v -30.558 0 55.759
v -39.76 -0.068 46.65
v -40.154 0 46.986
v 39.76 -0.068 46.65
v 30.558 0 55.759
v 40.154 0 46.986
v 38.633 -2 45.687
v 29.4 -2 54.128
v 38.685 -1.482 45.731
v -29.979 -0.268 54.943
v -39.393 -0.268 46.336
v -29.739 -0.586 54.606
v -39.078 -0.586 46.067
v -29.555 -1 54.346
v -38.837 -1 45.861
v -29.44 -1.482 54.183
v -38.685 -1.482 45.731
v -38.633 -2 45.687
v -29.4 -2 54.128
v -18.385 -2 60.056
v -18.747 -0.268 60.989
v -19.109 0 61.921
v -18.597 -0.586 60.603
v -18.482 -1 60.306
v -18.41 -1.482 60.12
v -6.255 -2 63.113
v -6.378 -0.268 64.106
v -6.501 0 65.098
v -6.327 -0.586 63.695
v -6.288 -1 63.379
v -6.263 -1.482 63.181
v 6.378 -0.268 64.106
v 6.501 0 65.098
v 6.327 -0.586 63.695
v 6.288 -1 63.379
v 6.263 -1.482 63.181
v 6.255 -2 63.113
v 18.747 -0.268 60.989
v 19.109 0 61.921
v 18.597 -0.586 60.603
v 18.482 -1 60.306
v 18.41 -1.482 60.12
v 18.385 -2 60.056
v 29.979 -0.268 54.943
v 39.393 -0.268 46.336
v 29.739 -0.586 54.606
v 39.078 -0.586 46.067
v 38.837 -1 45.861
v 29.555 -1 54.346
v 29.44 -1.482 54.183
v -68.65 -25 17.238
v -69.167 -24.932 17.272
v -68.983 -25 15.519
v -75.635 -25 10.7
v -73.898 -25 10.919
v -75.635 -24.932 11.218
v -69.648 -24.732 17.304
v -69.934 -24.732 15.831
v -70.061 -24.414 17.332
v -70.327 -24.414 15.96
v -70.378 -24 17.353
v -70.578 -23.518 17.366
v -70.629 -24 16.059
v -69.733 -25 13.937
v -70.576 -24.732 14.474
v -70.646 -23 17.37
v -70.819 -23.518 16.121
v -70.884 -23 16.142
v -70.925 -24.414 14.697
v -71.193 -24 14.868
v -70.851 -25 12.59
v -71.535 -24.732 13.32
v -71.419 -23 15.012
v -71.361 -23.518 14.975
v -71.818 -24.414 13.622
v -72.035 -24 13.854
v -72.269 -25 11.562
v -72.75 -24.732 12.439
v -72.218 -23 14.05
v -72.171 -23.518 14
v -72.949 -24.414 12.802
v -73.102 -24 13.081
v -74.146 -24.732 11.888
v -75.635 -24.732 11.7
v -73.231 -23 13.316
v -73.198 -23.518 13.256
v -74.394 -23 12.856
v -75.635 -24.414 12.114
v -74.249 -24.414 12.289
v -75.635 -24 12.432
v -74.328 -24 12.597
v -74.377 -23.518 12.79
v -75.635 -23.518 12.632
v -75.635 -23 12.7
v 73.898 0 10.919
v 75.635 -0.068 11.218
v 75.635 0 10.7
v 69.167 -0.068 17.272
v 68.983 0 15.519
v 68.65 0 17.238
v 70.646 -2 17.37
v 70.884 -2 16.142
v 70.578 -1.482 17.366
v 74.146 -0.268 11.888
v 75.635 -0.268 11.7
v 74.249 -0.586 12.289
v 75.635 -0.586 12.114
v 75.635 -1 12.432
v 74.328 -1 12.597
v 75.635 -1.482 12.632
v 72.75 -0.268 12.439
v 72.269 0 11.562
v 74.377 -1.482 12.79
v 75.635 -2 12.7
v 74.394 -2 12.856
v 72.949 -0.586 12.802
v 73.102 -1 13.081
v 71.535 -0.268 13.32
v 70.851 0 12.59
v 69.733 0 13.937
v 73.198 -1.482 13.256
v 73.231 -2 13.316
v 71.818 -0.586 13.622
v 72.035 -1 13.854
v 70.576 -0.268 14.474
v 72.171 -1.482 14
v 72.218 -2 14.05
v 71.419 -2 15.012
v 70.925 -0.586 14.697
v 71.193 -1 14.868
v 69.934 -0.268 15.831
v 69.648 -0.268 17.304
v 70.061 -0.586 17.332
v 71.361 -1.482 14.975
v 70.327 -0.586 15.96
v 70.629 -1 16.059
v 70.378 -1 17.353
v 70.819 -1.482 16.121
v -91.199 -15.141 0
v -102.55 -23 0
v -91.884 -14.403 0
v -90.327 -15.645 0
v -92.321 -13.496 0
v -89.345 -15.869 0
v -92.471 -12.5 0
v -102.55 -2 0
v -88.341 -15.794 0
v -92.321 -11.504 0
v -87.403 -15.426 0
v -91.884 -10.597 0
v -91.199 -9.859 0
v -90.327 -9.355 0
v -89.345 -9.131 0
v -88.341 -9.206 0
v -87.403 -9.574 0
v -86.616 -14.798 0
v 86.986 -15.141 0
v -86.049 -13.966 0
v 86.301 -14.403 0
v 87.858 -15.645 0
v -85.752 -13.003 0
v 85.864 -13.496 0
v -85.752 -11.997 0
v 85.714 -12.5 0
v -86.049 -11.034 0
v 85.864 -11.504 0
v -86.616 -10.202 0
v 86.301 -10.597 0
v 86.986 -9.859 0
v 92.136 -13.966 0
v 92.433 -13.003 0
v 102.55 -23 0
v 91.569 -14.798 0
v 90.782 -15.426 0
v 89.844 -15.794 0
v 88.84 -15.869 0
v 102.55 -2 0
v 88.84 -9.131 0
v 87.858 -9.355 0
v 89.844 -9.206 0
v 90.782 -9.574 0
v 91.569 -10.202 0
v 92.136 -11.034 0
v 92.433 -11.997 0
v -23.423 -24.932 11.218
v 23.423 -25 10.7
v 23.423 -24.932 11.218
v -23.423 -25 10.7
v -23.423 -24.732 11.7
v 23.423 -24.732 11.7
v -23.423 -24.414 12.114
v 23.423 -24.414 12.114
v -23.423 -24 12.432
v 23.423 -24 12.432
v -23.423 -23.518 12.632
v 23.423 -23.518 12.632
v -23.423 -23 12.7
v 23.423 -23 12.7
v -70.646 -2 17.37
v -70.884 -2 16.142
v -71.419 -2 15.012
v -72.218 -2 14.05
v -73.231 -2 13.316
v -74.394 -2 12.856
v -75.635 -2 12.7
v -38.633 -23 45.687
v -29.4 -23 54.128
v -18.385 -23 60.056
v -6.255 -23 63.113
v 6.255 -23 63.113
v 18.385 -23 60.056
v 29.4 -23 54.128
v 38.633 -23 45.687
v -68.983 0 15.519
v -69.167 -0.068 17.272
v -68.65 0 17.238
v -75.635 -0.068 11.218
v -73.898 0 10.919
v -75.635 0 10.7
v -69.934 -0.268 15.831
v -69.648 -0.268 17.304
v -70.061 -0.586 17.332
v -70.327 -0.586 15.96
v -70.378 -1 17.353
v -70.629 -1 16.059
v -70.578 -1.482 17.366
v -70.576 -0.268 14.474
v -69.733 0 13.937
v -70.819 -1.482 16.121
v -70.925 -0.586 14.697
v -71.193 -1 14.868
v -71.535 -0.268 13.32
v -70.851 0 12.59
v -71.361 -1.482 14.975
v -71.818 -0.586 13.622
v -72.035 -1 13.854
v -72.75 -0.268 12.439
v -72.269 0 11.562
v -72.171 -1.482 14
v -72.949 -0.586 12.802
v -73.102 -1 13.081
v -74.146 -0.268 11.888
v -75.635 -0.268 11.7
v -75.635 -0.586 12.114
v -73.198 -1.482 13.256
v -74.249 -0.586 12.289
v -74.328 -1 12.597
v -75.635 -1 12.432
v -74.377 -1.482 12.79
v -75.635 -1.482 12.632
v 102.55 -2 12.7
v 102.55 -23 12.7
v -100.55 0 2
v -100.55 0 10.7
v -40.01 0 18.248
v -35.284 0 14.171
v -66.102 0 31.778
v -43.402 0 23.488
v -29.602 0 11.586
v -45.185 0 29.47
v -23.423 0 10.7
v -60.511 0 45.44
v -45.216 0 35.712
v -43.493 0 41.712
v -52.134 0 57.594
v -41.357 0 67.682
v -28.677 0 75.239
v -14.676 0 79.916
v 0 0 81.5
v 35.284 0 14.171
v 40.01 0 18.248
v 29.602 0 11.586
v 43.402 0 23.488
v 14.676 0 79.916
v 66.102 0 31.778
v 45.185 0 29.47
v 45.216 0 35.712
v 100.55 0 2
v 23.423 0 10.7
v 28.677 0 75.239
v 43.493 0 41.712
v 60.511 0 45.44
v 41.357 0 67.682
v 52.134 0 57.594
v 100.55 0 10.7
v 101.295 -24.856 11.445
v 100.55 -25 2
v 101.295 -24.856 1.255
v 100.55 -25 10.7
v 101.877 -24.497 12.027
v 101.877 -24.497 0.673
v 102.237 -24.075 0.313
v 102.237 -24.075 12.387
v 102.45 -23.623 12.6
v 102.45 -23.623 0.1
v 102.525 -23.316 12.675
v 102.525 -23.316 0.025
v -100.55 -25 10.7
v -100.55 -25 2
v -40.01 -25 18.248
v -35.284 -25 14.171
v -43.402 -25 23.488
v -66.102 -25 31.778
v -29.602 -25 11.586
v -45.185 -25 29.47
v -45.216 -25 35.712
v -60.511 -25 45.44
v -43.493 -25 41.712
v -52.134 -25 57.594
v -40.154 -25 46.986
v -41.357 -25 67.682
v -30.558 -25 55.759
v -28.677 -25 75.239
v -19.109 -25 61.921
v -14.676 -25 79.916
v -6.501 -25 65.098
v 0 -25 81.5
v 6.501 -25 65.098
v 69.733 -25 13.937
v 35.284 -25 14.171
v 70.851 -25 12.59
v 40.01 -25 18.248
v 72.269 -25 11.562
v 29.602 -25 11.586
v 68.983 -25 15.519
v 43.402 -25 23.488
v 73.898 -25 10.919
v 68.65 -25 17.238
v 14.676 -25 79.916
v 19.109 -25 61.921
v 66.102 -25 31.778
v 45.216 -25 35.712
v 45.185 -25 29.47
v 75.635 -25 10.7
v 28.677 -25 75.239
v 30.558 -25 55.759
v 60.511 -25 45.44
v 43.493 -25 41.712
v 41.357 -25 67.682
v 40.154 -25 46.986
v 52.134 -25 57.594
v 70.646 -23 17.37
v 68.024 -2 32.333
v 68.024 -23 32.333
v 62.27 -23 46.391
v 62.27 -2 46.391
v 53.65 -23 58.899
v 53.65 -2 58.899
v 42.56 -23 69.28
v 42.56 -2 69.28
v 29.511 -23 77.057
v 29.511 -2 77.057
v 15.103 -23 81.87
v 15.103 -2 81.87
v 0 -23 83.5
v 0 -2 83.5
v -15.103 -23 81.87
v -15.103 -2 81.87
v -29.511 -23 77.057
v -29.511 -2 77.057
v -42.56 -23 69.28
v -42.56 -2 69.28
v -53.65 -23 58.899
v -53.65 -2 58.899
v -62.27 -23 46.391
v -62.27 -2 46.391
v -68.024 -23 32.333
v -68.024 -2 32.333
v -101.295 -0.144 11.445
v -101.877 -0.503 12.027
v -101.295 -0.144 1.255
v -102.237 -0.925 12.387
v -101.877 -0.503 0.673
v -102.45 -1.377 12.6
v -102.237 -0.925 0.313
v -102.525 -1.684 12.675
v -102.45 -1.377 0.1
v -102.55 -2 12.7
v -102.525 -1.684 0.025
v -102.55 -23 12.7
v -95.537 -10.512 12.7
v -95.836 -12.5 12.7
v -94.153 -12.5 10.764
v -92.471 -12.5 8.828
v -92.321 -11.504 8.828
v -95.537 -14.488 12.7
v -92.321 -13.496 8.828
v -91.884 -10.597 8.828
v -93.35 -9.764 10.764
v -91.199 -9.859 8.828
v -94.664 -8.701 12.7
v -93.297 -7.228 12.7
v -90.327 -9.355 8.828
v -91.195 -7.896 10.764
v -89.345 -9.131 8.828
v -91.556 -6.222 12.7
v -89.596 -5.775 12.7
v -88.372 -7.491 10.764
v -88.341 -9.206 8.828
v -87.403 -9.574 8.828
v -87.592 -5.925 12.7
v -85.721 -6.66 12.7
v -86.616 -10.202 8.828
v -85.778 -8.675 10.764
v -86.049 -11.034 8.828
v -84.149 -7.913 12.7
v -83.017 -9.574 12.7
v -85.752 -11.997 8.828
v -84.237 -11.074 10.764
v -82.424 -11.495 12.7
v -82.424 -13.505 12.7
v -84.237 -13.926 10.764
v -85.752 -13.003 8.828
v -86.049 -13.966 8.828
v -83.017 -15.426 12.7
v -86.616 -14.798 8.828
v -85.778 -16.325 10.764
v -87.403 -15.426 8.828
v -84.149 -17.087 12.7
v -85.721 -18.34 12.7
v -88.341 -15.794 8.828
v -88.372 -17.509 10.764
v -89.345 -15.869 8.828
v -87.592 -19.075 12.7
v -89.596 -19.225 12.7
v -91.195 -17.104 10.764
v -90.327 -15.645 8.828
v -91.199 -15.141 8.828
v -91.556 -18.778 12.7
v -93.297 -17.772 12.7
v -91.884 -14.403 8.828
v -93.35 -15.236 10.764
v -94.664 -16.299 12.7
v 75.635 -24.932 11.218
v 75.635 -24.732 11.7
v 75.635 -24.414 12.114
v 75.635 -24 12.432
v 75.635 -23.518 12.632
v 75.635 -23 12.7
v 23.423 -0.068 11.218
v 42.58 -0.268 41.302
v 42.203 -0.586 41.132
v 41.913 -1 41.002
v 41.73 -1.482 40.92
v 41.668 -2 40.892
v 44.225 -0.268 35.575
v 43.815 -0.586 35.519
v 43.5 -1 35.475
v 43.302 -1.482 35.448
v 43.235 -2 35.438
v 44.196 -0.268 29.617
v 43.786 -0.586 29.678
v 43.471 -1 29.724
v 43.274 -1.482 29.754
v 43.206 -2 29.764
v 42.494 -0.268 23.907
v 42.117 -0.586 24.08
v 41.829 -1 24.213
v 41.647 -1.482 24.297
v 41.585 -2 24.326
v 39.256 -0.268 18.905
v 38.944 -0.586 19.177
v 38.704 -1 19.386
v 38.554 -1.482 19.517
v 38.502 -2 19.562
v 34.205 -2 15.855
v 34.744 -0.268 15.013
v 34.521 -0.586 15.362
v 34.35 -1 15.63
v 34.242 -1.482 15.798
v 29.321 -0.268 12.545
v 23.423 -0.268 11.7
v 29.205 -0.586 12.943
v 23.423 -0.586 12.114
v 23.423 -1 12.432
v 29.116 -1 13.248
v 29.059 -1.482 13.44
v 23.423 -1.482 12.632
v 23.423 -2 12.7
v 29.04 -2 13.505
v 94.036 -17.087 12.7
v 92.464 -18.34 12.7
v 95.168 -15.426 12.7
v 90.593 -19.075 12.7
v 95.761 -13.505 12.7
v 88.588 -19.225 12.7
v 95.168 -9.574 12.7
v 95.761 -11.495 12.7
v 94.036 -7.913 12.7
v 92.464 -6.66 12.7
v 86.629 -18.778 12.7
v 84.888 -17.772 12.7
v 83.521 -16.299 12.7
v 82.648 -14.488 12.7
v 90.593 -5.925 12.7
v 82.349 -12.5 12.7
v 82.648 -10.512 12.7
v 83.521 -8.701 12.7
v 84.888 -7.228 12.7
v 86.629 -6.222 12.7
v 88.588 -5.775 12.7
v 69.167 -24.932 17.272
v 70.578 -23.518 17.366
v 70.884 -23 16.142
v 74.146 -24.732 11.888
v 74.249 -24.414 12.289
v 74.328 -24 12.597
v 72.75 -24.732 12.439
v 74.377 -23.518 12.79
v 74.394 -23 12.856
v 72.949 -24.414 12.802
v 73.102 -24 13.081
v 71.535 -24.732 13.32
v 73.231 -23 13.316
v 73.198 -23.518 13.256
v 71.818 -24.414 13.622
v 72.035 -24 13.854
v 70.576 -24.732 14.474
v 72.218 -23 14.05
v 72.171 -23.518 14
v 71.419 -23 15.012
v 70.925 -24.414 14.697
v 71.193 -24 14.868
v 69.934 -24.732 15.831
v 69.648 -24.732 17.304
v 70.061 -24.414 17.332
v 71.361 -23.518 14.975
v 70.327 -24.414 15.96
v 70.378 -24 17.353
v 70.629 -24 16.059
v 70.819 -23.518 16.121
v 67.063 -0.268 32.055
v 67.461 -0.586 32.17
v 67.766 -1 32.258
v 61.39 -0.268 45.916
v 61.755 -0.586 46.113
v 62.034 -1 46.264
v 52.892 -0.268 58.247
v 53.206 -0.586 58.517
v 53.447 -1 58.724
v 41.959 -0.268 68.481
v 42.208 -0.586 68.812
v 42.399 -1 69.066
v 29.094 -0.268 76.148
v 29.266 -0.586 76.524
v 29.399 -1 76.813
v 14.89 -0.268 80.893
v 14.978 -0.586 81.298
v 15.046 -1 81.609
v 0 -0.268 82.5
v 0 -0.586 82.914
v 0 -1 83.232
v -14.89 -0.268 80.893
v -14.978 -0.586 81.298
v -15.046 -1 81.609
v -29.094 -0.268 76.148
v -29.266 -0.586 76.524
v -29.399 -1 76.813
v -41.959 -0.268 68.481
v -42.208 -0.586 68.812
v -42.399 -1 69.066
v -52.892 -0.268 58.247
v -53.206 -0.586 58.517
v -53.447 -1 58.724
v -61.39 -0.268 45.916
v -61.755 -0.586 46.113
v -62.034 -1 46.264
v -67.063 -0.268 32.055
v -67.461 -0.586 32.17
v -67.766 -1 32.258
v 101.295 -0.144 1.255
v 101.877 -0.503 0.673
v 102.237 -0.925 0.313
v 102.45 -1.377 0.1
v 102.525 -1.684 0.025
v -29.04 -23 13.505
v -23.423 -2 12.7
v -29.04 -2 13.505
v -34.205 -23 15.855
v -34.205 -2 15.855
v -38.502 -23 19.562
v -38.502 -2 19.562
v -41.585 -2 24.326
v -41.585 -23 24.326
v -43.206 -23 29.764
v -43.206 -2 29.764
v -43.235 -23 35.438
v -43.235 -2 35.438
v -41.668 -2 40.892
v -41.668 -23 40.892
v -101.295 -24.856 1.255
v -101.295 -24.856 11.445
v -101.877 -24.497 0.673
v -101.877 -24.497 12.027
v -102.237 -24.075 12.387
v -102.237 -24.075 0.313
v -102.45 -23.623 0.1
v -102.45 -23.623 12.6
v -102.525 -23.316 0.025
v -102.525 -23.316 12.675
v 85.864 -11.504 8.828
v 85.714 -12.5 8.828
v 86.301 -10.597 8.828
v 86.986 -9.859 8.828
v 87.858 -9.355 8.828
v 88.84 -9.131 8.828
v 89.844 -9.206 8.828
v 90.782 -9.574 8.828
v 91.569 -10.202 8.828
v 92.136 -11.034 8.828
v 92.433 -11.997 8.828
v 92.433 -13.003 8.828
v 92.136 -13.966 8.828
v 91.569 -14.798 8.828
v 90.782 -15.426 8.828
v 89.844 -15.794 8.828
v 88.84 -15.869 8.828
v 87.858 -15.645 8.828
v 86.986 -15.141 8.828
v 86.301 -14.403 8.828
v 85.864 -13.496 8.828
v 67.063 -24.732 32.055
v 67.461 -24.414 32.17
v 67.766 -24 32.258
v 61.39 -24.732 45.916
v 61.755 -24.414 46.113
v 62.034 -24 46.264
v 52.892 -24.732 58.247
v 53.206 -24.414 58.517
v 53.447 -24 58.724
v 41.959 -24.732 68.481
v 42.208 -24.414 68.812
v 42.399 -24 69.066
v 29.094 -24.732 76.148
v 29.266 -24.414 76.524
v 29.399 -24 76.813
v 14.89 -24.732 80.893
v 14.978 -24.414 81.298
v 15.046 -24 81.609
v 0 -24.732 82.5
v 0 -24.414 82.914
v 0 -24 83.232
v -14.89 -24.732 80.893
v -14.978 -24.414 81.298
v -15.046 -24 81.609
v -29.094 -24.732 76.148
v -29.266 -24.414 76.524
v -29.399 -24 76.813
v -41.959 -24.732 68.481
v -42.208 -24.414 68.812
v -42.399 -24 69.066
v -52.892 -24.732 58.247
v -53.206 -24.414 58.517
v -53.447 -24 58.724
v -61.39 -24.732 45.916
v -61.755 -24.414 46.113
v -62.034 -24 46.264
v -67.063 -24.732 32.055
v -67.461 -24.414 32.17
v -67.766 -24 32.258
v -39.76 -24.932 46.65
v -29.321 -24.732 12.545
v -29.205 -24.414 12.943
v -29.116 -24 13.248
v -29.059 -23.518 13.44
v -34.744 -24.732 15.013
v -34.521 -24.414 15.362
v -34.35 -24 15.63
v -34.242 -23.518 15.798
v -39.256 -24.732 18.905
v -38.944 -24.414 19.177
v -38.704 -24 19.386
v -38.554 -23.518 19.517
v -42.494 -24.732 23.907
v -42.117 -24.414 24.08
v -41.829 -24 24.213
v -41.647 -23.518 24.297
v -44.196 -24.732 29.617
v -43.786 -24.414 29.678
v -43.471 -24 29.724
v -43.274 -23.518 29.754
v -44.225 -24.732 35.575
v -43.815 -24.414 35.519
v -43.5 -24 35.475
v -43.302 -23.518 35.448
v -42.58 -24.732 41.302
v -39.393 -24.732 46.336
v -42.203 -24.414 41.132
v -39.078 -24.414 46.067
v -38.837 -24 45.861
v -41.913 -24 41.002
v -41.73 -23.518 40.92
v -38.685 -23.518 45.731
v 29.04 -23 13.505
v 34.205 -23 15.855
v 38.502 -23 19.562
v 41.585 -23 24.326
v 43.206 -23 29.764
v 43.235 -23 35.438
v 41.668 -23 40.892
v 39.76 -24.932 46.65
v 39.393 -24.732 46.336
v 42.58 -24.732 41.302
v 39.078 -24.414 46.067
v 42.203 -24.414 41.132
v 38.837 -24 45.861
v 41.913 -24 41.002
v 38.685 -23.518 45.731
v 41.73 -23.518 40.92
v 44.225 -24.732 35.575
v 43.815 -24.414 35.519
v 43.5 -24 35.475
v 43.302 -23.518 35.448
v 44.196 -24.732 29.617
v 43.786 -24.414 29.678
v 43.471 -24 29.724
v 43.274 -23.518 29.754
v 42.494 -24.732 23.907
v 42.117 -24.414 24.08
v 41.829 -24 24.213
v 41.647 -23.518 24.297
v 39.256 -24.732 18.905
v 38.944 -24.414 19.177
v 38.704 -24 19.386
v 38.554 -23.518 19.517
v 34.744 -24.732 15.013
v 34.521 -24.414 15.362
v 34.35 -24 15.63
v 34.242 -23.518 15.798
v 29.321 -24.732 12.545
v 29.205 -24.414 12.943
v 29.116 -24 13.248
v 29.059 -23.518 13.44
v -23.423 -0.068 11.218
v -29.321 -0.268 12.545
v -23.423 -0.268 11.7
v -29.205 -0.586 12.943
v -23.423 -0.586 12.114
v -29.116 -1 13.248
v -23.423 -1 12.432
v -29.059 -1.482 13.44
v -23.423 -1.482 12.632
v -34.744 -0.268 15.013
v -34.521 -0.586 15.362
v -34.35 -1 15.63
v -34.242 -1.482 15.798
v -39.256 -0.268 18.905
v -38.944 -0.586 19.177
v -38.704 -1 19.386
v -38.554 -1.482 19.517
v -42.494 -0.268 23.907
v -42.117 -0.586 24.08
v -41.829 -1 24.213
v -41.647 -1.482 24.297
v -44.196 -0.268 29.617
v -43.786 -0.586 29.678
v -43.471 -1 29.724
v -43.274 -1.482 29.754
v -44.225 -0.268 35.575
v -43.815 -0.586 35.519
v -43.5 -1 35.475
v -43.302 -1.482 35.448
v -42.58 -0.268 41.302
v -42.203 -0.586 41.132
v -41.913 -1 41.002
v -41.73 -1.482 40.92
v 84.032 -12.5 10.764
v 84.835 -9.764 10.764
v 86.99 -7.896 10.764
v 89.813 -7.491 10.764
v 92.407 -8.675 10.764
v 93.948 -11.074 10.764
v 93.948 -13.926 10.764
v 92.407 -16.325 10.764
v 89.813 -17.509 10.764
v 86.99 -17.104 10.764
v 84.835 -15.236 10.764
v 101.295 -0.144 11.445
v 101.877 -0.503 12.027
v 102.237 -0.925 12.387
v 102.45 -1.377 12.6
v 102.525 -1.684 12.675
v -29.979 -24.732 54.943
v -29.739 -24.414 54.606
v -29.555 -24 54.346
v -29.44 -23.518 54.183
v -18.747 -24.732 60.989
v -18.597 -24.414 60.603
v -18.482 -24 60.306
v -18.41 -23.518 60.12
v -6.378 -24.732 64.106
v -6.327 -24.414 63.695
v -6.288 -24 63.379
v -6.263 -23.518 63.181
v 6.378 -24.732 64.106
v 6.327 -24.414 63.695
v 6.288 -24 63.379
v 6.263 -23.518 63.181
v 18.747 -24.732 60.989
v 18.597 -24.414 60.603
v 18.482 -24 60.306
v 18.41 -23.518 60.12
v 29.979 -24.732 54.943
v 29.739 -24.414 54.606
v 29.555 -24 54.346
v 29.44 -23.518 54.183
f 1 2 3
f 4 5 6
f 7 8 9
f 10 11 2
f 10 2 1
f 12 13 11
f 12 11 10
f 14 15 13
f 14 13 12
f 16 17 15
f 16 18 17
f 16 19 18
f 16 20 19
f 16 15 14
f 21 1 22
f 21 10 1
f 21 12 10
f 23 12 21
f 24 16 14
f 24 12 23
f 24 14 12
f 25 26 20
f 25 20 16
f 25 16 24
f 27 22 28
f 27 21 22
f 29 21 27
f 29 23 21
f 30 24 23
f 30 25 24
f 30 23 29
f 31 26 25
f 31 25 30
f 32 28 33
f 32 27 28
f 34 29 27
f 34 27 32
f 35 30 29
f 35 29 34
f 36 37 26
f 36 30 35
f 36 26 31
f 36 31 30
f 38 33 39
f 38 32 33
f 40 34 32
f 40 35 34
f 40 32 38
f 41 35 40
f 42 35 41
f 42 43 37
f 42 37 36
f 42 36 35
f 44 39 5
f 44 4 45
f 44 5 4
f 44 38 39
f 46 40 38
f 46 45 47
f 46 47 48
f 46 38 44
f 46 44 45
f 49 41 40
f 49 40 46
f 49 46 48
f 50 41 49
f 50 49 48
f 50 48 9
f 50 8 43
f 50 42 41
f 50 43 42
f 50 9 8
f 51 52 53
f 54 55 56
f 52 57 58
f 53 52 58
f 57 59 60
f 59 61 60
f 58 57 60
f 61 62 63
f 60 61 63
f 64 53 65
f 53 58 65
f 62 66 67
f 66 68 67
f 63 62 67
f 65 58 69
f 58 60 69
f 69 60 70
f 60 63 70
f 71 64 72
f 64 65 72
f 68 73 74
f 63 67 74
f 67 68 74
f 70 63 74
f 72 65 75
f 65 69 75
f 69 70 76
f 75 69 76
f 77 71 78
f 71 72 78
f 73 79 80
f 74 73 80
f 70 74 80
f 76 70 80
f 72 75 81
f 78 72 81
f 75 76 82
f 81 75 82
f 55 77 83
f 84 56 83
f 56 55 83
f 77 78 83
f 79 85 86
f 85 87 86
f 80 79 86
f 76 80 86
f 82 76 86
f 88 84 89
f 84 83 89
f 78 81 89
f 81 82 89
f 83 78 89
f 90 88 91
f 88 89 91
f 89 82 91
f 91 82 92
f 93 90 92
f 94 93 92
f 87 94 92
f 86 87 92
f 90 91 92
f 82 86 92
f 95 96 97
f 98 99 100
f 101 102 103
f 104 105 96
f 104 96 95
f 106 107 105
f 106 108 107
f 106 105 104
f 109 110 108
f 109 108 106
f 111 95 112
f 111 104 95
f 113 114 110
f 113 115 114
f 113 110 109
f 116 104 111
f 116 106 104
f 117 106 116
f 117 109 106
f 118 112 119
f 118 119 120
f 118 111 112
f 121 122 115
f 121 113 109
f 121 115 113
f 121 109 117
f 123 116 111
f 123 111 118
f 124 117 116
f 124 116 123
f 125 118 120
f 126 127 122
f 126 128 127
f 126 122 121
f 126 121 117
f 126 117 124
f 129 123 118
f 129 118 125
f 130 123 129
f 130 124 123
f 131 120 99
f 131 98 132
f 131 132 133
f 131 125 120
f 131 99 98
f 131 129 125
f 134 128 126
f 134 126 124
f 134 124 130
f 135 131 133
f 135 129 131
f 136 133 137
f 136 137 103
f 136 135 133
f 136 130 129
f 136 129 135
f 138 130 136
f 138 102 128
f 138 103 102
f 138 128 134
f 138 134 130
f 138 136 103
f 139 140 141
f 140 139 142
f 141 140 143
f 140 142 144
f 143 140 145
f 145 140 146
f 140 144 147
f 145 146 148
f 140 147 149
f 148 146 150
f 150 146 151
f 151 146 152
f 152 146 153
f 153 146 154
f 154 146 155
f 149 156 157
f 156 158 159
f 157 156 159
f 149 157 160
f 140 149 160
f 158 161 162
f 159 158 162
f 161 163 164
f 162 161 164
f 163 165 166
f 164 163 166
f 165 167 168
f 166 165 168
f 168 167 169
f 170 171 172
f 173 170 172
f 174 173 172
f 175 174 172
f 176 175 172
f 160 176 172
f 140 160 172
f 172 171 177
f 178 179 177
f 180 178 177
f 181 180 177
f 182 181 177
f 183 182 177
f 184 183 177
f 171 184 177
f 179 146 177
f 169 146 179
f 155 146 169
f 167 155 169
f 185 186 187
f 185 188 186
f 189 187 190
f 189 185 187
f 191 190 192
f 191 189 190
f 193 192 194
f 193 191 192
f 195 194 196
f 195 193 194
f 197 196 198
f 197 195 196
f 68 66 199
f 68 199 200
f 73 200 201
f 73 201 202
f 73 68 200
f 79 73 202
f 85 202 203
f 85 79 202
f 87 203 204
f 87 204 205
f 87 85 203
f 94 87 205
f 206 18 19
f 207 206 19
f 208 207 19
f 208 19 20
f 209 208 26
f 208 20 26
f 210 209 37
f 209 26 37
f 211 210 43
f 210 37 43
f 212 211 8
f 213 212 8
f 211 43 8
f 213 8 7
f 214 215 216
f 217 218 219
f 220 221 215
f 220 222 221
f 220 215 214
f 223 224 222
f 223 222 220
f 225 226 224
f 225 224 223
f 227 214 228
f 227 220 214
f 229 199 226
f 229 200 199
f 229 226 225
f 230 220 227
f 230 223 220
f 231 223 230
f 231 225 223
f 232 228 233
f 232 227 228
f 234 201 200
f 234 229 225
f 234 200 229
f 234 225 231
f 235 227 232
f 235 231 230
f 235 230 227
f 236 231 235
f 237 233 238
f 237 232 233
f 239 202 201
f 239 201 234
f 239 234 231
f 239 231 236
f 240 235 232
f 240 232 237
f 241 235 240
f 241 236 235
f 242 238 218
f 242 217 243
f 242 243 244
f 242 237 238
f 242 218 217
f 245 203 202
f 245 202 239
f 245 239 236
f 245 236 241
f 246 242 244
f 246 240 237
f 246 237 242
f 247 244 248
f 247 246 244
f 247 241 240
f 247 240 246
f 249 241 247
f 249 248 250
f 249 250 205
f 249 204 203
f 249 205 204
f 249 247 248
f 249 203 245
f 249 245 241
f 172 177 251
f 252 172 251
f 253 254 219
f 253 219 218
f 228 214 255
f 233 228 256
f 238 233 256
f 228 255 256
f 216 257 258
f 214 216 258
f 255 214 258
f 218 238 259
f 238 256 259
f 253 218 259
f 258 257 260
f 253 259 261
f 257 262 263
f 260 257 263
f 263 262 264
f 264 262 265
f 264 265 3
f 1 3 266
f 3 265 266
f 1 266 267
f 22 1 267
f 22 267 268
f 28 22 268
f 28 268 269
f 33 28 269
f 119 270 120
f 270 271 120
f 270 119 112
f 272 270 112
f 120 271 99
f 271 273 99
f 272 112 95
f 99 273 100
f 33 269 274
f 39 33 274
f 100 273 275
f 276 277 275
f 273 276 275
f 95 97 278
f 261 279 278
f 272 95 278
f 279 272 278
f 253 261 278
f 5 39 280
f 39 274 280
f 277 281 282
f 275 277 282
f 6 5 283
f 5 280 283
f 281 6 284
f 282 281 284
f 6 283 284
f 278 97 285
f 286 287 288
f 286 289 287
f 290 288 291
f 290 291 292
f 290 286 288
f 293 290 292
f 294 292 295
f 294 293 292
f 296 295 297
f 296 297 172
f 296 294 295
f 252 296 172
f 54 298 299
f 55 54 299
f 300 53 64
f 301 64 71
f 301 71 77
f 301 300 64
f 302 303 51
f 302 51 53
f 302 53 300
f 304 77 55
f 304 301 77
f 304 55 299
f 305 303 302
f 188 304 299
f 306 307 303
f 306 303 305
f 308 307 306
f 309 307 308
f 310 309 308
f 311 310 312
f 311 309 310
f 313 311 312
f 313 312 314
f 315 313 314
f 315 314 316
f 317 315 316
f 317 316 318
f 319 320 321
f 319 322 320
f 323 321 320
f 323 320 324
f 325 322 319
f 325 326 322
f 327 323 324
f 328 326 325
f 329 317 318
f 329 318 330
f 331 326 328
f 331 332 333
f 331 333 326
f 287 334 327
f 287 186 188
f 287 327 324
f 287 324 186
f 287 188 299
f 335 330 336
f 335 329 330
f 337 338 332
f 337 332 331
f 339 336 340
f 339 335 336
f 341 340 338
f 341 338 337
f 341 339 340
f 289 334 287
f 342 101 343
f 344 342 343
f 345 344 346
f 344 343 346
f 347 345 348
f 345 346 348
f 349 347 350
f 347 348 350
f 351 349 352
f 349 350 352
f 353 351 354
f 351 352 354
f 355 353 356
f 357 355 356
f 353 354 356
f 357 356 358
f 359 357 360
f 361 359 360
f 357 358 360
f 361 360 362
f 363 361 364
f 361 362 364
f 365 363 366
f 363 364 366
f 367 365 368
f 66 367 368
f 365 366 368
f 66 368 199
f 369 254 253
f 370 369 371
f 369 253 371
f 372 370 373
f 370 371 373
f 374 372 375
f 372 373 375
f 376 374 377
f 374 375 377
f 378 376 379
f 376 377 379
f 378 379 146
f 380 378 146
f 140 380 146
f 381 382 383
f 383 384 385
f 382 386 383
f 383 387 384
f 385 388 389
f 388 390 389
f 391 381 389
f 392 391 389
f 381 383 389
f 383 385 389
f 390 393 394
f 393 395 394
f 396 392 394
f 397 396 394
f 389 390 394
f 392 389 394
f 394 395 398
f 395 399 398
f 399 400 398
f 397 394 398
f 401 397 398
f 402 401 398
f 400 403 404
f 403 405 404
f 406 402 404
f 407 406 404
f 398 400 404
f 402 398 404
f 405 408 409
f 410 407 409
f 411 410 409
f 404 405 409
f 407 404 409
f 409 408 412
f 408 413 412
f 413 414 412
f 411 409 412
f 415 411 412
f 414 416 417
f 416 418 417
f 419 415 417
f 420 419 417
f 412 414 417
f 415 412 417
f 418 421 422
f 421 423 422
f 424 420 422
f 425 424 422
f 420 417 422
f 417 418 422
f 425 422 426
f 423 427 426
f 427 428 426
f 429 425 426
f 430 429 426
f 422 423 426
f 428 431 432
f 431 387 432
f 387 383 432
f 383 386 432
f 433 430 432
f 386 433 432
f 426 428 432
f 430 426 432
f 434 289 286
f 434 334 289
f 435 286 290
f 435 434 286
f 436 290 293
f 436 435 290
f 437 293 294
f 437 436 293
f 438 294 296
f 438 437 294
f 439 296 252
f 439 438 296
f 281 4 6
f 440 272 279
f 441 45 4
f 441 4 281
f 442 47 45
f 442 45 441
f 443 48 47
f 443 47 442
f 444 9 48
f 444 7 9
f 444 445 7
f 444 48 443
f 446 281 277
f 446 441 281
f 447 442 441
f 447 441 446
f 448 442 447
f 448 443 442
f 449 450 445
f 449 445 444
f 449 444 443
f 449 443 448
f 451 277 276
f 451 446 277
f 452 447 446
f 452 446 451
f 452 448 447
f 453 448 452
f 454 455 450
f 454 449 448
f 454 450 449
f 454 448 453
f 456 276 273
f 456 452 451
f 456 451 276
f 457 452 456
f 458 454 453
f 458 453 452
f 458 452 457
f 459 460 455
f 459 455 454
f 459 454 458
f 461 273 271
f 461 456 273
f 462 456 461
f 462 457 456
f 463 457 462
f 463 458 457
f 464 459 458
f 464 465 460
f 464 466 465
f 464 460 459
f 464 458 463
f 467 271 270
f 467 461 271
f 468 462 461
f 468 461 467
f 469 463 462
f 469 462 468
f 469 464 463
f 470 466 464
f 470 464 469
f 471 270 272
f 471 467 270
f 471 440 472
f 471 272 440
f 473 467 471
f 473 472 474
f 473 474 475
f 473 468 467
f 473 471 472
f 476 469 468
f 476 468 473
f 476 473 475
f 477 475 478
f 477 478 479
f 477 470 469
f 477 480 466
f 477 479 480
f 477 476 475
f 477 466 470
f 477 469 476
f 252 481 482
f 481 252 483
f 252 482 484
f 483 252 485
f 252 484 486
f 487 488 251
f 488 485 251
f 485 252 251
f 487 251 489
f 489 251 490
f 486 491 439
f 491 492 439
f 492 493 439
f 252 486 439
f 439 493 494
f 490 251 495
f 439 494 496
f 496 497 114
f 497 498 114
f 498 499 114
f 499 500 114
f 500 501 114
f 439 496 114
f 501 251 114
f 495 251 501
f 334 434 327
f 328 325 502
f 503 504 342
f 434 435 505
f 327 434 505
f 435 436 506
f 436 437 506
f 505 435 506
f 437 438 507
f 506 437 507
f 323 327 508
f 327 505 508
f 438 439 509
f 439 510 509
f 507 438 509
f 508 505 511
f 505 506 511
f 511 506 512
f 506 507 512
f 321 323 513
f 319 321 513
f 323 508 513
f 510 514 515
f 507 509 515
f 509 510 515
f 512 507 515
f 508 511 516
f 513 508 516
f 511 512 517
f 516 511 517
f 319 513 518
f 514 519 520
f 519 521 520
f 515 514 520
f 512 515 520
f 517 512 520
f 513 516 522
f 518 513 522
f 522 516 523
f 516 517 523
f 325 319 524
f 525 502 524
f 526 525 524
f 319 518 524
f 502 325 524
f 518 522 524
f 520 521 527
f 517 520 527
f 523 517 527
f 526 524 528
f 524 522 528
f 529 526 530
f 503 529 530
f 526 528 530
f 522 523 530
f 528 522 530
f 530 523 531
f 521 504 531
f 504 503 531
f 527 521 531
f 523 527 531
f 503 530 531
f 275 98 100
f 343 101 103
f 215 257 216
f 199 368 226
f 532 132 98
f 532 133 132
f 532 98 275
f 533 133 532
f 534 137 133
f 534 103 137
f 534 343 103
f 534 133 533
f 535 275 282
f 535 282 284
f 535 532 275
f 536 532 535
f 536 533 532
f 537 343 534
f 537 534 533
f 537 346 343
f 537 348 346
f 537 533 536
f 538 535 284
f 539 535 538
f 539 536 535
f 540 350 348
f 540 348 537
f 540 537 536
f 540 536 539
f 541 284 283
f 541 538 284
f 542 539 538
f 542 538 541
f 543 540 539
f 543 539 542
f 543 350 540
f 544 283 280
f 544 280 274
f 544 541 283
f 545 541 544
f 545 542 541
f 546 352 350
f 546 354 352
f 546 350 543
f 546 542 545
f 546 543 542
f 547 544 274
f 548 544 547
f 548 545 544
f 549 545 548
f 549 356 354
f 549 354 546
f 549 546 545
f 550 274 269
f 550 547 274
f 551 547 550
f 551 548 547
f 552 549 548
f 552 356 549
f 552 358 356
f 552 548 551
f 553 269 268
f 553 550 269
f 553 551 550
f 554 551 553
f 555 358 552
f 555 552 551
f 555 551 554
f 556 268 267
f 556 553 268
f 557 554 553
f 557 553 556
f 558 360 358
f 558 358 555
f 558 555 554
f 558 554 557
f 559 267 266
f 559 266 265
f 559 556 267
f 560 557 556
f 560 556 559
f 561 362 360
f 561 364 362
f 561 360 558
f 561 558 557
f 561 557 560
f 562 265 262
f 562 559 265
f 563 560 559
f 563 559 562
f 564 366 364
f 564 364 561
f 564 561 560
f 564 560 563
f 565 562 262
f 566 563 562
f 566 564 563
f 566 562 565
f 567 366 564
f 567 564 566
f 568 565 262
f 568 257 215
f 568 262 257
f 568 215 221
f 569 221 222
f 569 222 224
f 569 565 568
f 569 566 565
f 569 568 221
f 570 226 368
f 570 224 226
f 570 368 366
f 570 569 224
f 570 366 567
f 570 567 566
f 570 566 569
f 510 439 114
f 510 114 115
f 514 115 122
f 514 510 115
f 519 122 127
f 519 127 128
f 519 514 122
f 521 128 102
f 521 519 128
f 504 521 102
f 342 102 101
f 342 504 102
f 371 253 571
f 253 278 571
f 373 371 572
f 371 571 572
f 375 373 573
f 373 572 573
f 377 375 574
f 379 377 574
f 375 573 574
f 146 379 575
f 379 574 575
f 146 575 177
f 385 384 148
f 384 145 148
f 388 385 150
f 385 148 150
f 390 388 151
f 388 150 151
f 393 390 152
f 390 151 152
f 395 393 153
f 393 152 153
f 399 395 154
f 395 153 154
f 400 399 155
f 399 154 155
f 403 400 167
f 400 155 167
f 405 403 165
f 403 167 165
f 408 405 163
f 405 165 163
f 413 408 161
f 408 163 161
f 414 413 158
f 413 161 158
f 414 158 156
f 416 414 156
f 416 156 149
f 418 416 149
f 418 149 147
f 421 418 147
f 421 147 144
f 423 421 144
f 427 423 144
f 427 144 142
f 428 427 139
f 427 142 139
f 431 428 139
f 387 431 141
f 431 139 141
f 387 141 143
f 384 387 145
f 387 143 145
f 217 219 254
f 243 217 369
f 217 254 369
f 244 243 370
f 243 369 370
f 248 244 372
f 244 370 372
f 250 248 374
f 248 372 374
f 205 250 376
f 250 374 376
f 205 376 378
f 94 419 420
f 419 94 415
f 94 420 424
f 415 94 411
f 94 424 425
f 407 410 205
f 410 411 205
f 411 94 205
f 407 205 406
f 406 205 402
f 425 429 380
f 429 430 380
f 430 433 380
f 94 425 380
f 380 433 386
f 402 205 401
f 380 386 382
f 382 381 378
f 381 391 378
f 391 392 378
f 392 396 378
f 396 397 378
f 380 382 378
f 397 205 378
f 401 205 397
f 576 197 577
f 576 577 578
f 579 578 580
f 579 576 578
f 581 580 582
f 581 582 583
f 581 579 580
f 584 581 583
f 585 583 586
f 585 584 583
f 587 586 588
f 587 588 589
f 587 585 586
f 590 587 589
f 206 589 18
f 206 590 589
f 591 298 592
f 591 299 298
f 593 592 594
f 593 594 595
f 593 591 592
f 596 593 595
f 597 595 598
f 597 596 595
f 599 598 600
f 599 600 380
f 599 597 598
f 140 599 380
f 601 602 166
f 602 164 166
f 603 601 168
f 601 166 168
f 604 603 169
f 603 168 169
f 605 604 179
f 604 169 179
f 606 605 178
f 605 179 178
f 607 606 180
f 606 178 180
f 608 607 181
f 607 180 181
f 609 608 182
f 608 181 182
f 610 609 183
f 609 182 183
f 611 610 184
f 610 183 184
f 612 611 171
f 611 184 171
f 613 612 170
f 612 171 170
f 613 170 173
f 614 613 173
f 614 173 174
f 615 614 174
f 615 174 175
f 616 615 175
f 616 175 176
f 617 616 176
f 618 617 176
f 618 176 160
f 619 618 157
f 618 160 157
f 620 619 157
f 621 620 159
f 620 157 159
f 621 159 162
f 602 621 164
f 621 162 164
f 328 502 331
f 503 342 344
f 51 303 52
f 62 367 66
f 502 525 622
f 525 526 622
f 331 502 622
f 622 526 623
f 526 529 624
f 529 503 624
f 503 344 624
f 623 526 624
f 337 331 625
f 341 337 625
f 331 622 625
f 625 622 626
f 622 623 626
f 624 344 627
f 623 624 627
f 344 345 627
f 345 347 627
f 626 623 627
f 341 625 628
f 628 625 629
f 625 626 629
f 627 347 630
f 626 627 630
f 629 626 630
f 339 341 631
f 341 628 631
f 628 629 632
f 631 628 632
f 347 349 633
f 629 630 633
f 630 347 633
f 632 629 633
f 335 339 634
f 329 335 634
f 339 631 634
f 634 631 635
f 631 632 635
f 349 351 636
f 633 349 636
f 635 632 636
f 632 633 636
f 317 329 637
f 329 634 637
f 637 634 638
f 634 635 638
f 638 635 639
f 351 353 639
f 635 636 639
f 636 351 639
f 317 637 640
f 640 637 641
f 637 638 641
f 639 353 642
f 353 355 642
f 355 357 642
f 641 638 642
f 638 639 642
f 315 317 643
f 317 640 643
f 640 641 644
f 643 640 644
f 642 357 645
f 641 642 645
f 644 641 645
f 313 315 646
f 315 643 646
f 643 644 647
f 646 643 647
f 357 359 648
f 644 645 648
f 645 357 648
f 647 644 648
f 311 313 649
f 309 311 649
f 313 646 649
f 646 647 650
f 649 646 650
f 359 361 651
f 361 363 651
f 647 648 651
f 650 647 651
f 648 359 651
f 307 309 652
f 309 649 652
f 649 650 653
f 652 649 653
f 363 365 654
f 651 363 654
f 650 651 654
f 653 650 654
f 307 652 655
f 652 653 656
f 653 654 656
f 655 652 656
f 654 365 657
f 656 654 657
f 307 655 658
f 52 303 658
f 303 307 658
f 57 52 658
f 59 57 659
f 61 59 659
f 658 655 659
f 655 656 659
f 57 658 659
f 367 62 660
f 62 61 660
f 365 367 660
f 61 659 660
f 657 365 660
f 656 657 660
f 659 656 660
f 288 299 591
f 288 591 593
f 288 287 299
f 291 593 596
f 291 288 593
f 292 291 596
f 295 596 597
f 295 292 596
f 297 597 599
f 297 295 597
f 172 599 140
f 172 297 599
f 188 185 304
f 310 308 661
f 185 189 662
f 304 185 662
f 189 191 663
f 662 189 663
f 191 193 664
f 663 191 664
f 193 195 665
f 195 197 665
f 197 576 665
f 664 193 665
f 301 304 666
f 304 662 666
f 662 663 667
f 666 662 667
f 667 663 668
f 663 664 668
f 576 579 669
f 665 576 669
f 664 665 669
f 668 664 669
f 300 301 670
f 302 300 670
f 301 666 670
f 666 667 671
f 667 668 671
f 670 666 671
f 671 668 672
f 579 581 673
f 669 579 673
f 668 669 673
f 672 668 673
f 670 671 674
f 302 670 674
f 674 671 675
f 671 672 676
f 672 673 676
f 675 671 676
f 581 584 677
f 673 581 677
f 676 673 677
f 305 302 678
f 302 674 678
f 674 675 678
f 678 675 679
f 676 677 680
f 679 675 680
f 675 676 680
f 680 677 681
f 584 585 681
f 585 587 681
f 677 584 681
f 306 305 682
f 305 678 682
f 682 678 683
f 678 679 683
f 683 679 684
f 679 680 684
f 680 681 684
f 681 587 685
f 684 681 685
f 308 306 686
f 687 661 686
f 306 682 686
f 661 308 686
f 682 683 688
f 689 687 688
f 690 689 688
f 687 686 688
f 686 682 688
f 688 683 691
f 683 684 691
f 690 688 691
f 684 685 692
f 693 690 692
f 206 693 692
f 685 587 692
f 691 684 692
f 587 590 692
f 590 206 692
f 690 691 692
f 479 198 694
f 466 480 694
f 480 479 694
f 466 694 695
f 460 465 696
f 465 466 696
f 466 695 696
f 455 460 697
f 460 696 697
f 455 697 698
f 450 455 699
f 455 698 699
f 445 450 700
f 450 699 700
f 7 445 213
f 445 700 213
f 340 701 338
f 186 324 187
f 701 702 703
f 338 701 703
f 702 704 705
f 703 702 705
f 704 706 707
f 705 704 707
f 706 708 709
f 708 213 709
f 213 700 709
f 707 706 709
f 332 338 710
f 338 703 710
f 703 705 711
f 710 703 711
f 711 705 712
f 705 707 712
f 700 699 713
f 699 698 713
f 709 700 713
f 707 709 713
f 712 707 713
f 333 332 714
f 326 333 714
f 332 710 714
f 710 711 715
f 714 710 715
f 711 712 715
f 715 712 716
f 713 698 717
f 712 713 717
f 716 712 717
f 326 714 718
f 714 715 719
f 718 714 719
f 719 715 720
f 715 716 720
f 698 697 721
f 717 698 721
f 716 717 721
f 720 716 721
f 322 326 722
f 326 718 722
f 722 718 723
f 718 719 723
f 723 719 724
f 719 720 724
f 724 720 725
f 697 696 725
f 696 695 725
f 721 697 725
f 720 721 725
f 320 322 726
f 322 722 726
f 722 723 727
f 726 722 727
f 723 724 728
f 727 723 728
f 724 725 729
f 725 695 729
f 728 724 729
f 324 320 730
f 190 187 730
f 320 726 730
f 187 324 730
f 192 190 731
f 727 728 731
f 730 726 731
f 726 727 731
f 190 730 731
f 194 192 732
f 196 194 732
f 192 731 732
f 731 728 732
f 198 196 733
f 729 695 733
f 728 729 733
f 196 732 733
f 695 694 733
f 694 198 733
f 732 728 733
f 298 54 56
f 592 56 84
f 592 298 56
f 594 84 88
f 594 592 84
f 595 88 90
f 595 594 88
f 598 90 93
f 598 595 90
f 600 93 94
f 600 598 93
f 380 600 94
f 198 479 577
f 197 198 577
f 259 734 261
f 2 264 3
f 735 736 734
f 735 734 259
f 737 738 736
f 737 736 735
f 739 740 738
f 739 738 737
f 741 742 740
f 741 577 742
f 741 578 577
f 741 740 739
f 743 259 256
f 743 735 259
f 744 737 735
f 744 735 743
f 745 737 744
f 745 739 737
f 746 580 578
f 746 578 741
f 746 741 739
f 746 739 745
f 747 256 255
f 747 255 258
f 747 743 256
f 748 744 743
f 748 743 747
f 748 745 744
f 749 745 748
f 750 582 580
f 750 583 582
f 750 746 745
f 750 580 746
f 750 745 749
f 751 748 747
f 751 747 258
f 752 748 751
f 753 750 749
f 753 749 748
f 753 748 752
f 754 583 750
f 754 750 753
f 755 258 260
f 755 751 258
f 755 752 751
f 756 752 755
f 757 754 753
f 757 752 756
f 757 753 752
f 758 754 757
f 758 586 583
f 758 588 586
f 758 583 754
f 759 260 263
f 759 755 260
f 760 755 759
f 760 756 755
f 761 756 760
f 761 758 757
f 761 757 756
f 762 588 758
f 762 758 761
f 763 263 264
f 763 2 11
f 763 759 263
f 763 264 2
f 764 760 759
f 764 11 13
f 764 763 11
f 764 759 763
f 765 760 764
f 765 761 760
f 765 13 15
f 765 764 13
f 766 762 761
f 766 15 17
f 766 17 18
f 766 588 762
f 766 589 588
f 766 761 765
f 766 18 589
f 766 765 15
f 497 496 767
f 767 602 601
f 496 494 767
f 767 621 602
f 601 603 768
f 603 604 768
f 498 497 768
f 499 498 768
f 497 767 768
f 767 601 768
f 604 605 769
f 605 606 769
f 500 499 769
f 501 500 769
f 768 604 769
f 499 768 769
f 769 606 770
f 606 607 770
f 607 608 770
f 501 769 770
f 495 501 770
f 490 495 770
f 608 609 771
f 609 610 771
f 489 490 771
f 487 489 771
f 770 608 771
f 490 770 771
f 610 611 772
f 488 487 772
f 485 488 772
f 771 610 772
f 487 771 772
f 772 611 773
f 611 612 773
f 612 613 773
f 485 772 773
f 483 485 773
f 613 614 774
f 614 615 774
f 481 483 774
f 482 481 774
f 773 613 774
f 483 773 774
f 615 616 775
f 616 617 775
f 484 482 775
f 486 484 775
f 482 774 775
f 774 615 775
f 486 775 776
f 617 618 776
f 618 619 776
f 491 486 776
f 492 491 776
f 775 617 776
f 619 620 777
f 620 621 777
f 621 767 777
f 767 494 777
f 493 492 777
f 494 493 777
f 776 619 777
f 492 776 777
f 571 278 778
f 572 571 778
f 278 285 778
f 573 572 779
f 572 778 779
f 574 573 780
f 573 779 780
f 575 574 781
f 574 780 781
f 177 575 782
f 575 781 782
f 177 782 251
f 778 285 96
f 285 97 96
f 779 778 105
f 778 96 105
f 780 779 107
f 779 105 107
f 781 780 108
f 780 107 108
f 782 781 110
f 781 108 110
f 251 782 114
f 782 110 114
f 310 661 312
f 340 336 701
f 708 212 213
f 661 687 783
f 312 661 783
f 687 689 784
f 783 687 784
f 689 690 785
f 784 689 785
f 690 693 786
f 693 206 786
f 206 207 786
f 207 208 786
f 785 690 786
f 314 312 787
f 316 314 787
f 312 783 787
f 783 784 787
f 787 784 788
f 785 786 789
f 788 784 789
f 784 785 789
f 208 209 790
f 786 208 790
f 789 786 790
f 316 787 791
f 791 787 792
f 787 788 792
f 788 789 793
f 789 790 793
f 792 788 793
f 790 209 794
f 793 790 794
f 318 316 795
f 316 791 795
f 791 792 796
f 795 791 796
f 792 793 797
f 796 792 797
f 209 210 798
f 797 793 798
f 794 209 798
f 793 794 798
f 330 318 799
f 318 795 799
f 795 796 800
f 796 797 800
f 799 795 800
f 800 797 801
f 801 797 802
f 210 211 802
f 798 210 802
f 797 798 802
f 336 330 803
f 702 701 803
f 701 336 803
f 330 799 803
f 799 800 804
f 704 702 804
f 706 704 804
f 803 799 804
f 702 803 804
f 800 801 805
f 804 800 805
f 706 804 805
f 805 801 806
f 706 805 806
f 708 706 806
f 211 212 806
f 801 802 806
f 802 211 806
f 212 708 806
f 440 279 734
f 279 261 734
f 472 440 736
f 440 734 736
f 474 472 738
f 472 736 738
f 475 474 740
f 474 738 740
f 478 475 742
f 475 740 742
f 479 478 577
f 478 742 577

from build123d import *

# Parameters (mm, degrees)
F1_DEPTH       = 25
F2_R           = 20
F3_R           = 5
F5_D           = 6.7564
F5_DEPTH       = 15
F5_CSINK_D     = 13.4874
F5_CSINK_ANGLE = 82
F5_TIP         = 2.0298273432
F6_R           = 2


with BuildPart() as f1:
    # F0 (on Front) → F1 (new body)
    with BuildSketch(Plane.XZ):
        Polygon((-70.8, 12.7), (-102.55, 12.7), (-102.55, 0), (102.55, 0), (102.55, 12.7), (70.8, 12.7), (50.8, 12.7), (-50.8, 12.7), align=None)
        with BuildLine():
            ThreePointArc((70.8, 12.7), (0, 83.5), (-70.8, 12.7))
            Line((-70.8, 12.7), (-50.8, 12.7))
            ThreePointArc((-50.8, 12.7), (0, 63.5), (50.8, 12.7))
            Line((50.8, 12.7), (70.8, 12.7))
        make_face()
    extrude(amount=F1_DEPTH)

    # F2
    f2_edges = [f1.edges().sort_by_distance(p)[0] for p in [
        (50.8, -12.5, 12.7),
        (-50.8, -12.5, 12.7),
    ]]
    fillet(f2_edges, radius=F2_R)

    # F3
    f3_edges = [f1.edges().sort_by_distance(p)[0] for p in [
        (70.8, -12.5, 12.7),
        (-70.8, -12.5, 12.7),
    ]]
    fillet(f3_edges, radius=F3_R)

    # F5
    with Locations(Plane.XY.offset(12.7)):
        with Locations((89.0924562867, -12.5), (-89.0924562867, -12.5)):
            CounterSinkHole(F5_D / 2, F5_CSINK_D / 2, depth=F5_DEPTH, counter_sink_angle=F5_CSINK_ANGLE)
            with Locations((0, 0, -(F5_DEPTH + F5_TIP / 2))):  # 118° drill point
                Cone(0, F5_D / 2, F5_TIP, mode=Mode.SUBTRACT)

    # F6
    f6_edges = [f1.edges().sort_by_distance(p)[0] for p in [
        (-89.092456, -25, 12.7),
        (-72.217975, -25, 14.049721),
        (-102.55, -25, 6.35),
        (0, -25, 83.5),
        (0, -25, 0),
        (72.217975, -25, 14.049721),
        (102.55, -25, 6.35),
        (89.092456, -25, 12.7),
        (0, -25, 12.7),
        (41.585393, -25, 24.325642),
        (-41.585393, -25, 24.325642),
        (0, -25, 63.5),
        (-89.092456, 0, 12.7),
        (-72.217975, 0, 14.049721),
        (-102.55, 0, 6.35),
        (0, 0, 83.5),
        (0, 0, 0),
        (72.217975, 0, 14.049721),
        (102.55, 0, 6.35),
        (89.092456, 0, 12.7),
        (0, 0, 12.7),
        (41.585393, 0, 24.325642),
        (-41.585393, 0, 24.325642),
        (0, 0, 63.5),
    ]]
    fillet(f6_edges, radius=F6_R)


solid = f1.part
